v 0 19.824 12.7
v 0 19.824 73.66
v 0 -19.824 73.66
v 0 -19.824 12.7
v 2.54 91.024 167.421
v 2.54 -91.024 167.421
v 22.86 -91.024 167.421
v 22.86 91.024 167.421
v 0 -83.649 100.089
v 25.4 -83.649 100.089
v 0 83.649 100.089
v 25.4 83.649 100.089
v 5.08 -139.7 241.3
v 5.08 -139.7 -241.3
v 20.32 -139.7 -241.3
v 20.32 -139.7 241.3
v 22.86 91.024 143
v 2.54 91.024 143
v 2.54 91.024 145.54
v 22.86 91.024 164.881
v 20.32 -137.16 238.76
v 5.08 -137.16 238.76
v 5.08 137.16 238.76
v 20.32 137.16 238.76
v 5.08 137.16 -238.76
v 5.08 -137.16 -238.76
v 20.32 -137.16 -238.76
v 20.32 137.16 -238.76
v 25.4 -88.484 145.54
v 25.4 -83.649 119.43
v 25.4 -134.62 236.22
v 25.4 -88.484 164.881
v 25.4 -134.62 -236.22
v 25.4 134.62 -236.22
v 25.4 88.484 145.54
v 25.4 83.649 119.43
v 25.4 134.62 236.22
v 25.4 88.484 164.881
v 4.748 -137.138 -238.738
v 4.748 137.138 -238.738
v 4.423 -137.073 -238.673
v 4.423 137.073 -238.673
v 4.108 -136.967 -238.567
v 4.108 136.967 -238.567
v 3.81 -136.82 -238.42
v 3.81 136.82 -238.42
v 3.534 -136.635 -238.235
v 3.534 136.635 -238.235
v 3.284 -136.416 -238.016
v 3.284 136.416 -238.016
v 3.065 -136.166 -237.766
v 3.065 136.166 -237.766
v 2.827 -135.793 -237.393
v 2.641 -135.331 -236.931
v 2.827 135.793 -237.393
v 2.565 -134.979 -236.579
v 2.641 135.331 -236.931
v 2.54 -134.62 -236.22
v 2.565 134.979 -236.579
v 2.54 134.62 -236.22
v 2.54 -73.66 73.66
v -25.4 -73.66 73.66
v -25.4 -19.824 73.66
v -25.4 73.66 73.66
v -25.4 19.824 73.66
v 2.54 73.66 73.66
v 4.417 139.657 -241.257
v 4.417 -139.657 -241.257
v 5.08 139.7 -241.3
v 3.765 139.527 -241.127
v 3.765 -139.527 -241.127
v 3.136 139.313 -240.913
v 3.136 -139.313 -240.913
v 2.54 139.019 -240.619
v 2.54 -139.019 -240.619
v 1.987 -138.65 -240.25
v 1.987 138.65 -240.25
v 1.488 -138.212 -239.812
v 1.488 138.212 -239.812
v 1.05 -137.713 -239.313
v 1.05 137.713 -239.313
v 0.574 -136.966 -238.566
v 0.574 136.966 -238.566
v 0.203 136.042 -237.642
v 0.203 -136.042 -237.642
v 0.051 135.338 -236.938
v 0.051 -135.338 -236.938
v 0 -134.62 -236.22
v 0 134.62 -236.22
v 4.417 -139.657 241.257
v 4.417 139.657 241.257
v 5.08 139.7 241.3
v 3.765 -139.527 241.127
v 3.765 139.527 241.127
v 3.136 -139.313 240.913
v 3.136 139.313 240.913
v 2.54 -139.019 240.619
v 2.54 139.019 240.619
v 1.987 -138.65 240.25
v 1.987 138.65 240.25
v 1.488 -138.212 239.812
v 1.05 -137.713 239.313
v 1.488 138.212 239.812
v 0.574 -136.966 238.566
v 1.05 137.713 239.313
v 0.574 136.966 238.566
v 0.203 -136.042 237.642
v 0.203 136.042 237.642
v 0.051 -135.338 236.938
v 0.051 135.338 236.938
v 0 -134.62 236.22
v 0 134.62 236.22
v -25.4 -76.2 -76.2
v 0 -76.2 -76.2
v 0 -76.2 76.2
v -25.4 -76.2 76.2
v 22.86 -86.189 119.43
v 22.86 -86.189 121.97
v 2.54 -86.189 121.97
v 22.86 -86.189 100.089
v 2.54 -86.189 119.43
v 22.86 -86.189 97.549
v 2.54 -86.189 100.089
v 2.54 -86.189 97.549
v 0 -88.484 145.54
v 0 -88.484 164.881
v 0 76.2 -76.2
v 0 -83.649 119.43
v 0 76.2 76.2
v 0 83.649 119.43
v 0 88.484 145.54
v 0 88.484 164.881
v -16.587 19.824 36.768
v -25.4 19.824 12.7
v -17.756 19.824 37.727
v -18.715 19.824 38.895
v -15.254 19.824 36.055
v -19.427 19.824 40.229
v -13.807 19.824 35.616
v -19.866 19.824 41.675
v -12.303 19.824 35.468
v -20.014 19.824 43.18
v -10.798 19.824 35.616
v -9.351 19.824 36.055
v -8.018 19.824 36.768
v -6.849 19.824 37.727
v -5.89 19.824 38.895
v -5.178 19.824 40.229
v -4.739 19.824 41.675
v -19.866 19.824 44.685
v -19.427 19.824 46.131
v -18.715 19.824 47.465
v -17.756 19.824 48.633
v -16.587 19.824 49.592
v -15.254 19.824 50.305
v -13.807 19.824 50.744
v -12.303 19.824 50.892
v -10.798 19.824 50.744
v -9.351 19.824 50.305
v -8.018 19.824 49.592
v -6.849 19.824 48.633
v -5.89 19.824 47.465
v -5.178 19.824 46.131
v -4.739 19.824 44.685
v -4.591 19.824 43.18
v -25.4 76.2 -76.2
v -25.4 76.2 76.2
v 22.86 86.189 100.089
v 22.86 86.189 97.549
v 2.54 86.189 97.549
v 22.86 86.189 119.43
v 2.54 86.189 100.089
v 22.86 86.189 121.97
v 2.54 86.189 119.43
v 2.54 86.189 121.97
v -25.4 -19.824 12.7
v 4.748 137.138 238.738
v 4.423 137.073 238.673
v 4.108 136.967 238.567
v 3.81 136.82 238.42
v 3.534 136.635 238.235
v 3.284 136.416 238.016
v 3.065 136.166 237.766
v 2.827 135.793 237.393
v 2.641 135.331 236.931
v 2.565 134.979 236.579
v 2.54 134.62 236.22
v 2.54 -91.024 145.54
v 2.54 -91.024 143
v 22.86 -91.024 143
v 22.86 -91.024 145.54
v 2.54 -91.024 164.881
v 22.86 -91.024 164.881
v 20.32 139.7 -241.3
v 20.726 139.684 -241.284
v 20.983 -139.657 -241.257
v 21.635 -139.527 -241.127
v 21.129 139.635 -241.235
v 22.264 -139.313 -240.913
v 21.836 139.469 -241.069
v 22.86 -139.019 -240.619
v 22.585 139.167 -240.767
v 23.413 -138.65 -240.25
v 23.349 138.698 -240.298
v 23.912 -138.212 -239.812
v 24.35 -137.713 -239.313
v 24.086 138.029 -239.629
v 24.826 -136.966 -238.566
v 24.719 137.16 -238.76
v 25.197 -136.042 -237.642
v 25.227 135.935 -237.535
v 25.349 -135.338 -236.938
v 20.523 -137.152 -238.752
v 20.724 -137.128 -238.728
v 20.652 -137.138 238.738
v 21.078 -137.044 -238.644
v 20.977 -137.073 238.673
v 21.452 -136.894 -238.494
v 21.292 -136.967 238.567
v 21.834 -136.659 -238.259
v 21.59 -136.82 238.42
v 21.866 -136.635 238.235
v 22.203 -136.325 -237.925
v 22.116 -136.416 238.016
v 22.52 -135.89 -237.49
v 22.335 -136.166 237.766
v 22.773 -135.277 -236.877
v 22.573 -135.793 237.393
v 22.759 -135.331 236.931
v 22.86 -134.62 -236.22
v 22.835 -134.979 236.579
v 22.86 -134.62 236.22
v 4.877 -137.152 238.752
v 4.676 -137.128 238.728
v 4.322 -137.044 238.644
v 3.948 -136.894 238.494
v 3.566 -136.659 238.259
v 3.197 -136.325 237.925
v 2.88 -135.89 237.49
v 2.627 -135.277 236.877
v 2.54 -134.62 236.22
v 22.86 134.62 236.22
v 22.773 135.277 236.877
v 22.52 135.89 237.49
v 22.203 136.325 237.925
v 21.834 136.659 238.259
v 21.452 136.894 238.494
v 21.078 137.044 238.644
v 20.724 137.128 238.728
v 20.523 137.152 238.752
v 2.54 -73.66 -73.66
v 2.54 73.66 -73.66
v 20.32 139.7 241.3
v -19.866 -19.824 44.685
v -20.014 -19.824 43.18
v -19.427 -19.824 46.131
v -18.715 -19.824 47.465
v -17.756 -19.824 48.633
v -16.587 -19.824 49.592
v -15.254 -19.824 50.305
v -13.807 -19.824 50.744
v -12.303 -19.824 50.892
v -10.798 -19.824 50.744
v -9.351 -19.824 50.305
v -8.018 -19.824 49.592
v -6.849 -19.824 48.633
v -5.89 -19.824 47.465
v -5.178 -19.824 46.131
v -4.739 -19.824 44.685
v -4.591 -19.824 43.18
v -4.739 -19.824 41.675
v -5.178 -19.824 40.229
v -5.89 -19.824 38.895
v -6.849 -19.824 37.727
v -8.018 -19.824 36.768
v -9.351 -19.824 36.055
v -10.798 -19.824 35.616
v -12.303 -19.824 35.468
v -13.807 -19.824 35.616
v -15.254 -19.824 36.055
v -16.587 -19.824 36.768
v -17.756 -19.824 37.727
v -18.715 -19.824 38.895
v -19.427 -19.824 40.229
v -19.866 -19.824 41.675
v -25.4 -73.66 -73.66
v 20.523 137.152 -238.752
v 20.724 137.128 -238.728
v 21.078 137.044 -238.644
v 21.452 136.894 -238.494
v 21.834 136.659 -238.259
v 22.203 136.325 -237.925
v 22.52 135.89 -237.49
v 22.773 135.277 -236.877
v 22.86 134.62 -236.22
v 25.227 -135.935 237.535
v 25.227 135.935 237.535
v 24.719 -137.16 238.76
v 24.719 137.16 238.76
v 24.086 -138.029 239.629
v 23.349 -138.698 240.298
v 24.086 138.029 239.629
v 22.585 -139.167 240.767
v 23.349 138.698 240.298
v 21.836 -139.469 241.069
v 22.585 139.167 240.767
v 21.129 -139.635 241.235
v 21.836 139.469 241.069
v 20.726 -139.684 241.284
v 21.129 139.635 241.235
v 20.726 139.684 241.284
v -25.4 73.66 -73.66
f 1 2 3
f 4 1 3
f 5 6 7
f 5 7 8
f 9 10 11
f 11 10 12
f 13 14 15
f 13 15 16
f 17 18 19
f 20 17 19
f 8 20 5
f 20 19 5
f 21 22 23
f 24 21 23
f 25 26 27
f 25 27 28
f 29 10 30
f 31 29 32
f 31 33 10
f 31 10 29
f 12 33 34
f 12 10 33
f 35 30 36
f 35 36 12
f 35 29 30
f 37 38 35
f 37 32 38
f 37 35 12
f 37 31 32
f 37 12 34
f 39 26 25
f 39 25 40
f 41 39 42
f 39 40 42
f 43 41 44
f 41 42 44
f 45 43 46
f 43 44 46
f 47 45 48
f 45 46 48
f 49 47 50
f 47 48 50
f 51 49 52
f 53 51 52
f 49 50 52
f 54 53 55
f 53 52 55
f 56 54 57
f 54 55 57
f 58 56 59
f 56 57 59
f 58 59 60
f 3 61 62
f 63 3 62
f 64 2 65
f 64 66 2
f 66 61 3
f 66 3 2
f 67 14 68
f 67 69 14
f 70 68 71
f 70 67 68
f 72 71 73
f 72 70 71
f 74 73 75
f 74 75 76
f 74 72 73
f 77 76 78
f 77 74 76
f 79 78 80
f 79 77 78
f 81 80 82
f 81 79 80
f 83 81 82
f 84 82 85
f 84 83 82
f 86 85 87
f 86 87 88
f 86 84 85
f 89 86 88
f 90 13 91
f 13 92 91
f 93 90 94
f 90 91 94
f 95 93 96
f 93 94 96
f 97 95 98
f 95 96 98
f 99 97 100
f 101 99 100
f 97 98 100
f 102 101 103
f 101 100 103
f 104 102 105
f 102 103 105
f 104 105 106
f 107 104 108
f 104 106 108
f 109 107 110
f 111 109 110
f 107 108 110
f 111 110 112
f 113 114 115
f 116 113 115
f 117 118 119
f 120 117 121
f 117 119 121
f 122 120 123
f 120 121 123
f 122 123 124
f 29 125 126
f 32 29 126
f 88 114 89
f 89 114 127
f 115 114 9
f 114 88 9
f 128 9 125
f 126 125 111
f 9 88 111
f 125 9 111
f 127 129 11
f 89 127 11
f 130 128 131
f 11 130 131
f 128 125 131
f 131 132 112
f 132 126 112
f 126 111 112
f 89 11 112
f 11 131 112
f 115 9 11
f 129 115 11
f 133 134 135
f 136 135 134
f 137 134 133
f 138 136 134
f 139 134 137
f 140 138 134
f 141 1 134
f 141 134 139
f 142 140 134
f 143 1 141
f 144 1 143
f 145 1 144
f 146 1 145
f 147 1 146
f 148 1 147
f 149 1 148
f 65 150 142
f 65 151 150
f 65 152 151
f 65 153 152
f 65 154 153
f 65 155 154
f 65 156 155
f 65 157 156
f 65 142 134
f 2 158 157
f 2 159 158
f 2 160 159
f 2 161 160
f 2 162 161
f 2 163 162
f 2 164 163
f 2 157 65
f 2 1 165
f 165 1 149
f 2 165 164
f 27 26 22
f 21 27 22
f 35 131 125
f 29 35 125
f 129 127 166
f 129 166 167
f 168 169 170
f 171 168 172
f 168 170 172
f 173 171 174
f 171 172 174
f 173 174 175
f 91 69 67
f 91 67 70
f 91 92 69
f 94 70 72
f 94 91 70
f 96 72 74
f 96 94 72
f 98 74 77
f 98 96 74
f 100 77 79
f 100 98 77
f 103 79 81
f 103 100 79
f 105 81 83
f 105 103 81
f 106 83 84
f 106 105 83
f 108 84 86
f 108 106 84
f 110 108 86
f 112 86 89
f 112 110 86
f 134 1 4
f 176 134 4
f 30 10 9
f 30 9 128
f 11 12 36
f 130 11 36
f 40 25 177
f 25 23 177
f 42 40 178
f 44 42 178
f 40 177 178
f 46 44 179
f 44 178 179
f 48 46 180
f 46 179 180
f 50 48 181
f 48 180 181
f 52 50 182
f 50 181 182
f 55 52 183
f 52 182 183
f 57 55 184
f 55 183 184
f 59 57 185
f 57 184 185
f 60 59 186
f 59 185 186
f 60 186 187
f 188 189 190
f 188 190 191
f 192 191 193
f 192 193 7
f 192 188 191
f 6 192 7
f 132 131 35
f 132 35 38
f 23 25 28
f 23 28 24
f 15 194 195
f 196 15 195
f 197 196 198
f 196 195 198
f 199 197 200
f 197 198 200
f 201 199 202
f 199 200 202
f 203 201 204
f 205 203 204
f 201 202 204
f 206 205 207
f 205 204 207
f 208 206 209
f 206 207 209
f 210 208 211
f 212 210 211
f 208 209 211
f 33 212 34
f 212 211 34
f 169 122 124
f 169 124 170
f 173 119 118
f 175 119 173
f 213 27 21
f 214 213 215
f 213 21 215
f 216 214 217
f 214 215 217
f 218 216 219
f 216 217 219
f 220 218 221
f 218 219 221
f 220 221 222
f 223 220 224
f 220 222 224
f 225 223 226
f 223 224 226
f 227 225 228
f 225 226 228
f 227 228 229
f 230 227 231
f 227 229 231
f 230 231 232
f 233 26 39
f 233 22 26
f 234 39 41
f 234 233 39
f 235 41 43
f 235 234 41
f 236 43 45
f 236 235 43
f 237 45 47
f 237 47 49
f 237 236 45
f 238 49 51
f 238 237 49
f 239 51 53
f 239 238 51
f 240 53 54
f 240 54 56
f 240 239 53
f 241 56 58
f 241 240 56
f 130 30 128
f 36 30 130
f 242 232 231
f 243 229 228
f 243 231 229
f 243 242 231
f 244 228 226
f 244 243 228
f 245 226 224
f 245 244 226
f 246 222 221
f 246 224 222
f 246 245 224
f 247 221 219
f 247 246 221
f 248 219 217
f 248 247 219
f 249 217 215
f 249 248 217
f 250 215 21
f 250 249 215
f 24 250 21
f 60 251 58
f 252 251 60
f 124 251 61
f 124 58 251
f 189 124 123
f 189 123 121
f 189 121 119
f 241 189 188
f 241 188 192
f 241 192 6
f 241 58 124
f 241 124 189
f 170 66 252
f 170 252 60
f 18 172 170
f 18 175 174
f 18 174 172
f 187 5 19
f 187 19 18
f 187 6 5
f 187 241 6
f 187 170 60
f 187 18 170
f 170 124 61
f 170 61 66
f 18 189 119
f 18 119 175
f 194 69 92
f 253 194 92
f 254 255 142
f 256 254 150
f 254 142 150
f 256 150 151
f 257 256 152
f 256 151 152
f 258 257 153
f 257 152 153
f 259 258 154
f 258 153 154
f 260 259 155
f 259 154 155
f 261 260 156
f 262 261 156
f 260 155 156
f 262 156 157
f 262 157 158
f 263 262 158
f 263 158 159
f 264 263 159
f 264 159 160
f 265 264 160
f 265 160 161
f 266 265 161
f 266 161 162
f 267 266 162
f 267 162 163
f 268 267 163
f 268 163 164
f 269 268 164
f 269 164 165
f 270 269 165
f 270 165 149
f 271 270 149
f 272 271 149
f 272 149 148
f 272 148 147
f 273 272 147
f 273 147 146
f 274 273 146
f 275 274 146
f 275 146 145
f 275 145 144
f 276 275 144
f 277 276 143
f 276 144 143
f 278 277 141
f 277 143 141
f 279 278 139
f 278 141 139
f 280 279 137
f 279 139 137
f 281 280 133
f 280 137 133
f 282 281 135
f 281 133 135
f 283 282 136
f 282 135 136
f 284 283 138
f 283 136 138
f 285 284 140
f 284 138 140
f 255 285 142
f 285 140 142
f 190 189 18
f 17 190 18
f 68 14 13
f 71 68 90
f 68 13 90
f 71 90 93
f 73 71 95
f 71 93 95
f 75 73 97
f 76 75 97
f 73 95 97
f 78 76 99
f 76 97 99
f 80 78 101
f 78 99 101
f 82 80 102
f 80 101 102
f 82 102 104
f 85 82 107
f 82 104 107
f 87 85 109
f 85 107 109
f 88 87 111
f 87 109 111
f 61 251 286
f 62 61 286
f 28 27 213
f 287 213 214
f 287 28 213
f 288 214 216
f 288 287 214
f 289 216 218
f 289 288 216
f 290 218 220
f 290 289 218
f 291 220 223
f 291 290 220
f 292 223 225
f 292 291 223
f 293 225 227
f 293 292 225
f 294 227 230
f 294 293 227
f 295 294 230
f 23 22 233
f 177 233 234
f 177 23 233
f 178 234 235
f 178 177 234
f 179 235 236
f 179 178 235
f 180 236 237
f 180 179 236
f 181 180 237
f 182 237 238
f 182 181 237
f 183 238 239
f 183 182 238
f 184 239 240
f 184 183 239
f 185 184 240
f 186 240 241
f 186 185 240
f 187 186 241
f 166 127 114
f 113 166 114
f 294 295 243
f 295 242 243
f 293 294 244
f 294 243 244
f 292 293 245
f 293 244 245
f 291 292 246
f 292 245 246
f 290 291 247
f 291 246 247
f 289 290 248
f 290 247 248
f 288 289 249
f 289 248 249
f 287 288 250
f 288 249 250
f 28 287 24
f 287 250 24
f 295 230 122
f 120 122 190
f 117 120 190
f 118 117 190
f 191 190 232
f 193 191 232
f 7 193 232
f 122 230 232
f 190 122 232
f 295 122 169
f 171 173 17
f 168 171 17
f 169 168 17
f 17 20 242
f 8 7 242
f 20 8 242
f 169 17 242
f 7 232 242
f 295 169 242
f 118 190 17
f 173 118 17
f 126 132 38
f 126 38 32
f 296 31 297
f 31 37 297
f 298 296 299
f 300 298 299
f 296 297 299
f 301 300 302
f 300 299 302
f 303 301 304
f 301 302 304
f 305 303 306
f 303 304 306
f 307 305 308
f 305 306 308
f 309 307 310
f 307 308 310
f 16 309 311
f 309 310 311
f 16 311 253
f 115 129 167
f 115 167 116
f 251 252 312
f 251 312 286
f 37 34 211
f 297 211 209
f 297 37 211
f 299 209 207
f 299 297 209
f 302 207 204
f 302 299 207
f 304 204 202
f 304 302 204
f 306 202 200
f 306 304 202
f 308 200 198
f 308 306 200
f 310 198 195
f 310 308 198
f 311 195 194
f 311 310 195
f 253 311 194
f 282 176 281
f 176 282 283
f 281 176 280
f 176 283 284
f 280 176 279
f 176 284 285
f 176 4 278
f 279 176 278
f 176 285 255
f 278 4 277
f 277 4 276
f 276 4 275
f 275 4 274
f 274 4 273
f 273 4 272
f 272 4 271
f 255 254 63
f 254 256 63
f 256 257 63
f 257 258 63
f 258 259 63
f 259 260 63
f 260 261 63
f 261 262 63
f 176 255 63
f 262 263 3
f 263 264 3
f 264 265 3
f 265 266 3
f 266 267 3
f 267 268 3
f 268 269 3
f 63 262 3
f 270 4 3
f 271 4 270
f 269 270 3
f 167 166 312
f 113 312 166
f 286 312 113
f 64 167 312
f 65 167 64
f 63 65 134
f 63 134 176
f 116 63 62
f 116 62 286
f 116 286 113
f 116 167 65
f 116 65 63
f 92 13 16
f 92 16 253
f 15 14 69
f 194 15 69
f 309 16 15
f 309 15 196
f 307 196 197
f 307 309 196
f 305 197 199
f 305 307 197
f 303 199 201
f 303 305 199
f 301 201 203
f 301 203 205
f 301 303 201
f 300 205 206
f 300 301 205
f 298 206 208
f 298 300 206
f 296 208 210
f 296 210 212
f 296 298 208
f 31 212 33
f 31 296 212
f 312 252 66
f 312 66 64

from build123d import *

# Parameters (mm, degrees)
F0_W         = 279.4
F0_H         = 482.6
F1_DEPTH     = 25.4
F2_R         = 5.08
F3_R         = 5.08
F4_W         = 176.9686788321
F4_H         = 19.3408131599
F5_DEPTH     = 25.4
F6_W         = 167.2982573509
F6_H         = 19.3408429623
F7_DEPTH     = 25.4
F8_W         = 152.4
F8_H         = 152.4
F9_DEPTH     = 25.4
F10_T        = 2.54
F10_T3_DEPTH = 157.48
F10_T5_DEPTH = 157.48
F10_T7_DEPTH = 30.48
F11_W        = 39.6487191319
F11_H        = 63.5
F12_DEPTH    = 25.4
F13_R        = 7.7119354401
F14_DEPTH    = 50.8


# Not quite as in the source:
# - a shell that OpenCascade refuses in one call is made with other operations: the cavity is built on its own and cut out


with BuildPart() as f1:
    # F0 (on Right) → F1 (new body)
    with BuildSketch(Plane.YZ):
        Rectangle(F0_W, F0_H)
    extrude(amount=F1_DEPTH)

    # F2
    f2_edges = [f1.edges().sort_by_distance(p)[0] for p in [
        (0, 139.7, 0),
        (0, 0, 241.3),
        (0, -139.7, 0),
        (0, 0, -241.3),
    ]]
    fillet(f2_edges, radius=F2_R)

    # F3
    f3_edges = [f1.edges().sort_by_distance(p)[0] for p in [
        (25.4, 139.7, 0),
        (25.4, 0, 241.3),
        (25.4, -139.7, 0),
        (25.4, 0, -241.3),
    ]]
    fillet(f3_edges, radius=F3_R)

    # F4 (on face) → F5 (cut)
    with BuildSketch(Plane(origin=(0, 0, 0), x_dir=(0, -1, 0), z_dir=(-1, 0, 0))):
        with Locations((0, 155.2102416754)):
            Rectangle(F4_W, F4_H)
    extrude(amount=-F5_DEPTH, mode=Mode.SUBTRACT)

    # F6 (on face) → F7 (cut)
    with BuildSketch(Plane.YZ.offset(25.4)):
        with Locations((0, 109.7592636943)):
            Rectangle(F6_W, F6_H)
    extrude(amount=-F7_DEPTH, mode=Mode.SUBTRACT)

    # F8 (on face) → F9 (join)
    with BuildSketch(Plane(origin=(0, 0, 0), x_dir=(0, -1, 0), z_dir=(-1, 0, 0))):
        Rectangle(F8_W, F8_H)
    extrude(amount=F9_DEPTH)

    # F10: shell of thickness 2.54, made by hand


with BuildPart() as f10_core1:
    # F10_t2: copy of F1
    add(f1.part)

    # the walls: a layer under each face that stays
    f10_faces = [f10_core1.faces().sort_by_distance(p)[0] for p in [
        (12.7, 139.7, 0),
        (12.7, 0, -241.3),
        (23.912103095, 138.2121018019, 0),
        (1.4878975516, 138.2121024484, 0),
        (12.7, 0, 241.3),
        (12.7, -139.7, 0),
        (23.912103095, 0, -239.8121018019),
        (1.4878975516, 0, -239.8121024484),
        (25.4, 0, 0),
        (23.912103095, 0, 239.8121018019),
        (0, -89.7466666667, -157.48),
        (1.4878975516, 0, 239.8121024484),
        (23.912103095, -138.2121018019, 0),
        (1.4878975516, -138.2121024484, 0),
        (12.7, 0, 119.4296851754),
        (12.7, -83.6491286755, 109.7592636943),
        (12.7, 0, 100.0888422132),
        (12.7, 83.6491286755, 109.7592636943),
        (12.7, -88.484339416, 155.2102416754),
        (12.7, 0, 145.5398350954),
        (12.7, 0, 164.8806482553),
        (12.7, 88.484339416, 155.2102416754),
        (-12.7, -76.2, 0),
        (-12.7, 0, -76.2),
        (-12.7, 76.2, 0),
        (-12.7, 0, 76.2),
    ]]
    thicken(f10_faces, amount=-F10_T, mode=Mode.SUBTRACT)

    # F10_s4 → F10_t3 (cut)
    with BuildSketch(Plane.XY.offset(-78.74)):
        Polygon((-0.0254, -76.2254), (2.54, -76.2), (2.54, -73.66), (0, -73.66), align=None)
        Polygon((-0.0254, 76.2254), (2.54, 76.2), (2.54, 73.66), (0, 73.66), align=None)
    extrude(amount=F10_T3_DEPTH, mode=Mode.SUBTRACT)

    # F10_s6 → F10_t5 (cut)
    with BuildSketch(Plane.XZ.offset(-78.74)):
        Polygon((-0.0254, -76.2254), (2.54, -76.2), (2.54, -73.66), (0, -73.66), align=None)
        Polygon((-0.0254, 76.2254), (2.54, 76.2), (2.54, 73.66), (0, 73.66), align=None)
    extrude(amount=F10_T5_DEPTH, mode=Mode.SUBTRACT)

    # F10_s8 → F10_t7 (cut)
    with BuildSketch(Plane.YZ.offset(-2.54)):
        Polygon((83.6237286755, 119.4042851754), (83.6491286755, 121.9696851754), (86.1891286755, 121.9696851754), (86.1891286755, 119.4296851754), align=None)
        Polygon((-83.6237286755, 119.4042851754), (-83.6491286755, 121.9696851754), (-86.1891286755, 121.9696851754), (-86.1891286755, 119.4296851754), align=None)
        Polygon((-83.6237286755, 100.1142422132), (-86.1891286755, 100.0888422132), (-86.1891286755, 97.5488422132), (-83.6491286755, 97.5488422132), align=None)
        Polygon((83.6237286755, 100.1142422132), (83.6491286755, 97.5488422132), (86.1891286755, 97.5488422132), (86.1891286755, 100.0888422132), align=None)
        Polygon((-88.458939416, 145.5652350954), (-91.024339416, 145.5398350954), (-91.024339416, 142.9998350954), (-88.484339416, 142.9998350954), align=None)
        Polygon((-88.458939416, 164.8552482553), (-91.024339416, 164.8806482553), (-91.024339416, 167.4206482553), (-88.484339416, 167.4206482553), align=None)
        Polygon((88.458939416, 145.5652350954), (88.484339416, 142.9998350954), (91.024339416, 142.9998350954), (91.024339416, 145.5398350954), align=None)
        Polygon((88.458939416, 164.8552482553), (88.484339416, 167.4206482553), (91.024339416, 167.4206482553), (91.024339416, 164.8806482553), align=None)
    extrude(amount=F10_T7_DEPTH, mode=Mode.SUBTRACT)


with BuildPart() as f1_1:
    add(f1.part)

    # what is left inside the walls is the cavity
    f10_cavity = [f10_core1.part.solids().sort_by_distance(p)[0] for p in [
        (22.8346, 0, -78.74),
    ]]
    add(f10_cavity, mode=Mode.SUBTRACT)

    # F11 (on face) → F12 (join)
    with BuildSketch(Plane(origin=(0, 0, 0), x_dir=(0, -1, 0), z_dir=(-1, 0, 0))):
        with Locations((0, 44.45)):
            Rectangle(F11_W, F11_H)
    extrude(amount=F12_DEPTH)

    # F13 (on face) → F14 (cut)
    with BuildSketch(Plane(origin=(0, 19.824359566, 0), x_dir=(-1, 0, 0), z_dir=(0, 1, 0))):
        with Locations((12.3025374487, 43.18)):
            Circle(F13_R)
    extrude(amount=-F14_DEPTH, mode=Mode.SUBTRACT)


solid = f1_1.part
